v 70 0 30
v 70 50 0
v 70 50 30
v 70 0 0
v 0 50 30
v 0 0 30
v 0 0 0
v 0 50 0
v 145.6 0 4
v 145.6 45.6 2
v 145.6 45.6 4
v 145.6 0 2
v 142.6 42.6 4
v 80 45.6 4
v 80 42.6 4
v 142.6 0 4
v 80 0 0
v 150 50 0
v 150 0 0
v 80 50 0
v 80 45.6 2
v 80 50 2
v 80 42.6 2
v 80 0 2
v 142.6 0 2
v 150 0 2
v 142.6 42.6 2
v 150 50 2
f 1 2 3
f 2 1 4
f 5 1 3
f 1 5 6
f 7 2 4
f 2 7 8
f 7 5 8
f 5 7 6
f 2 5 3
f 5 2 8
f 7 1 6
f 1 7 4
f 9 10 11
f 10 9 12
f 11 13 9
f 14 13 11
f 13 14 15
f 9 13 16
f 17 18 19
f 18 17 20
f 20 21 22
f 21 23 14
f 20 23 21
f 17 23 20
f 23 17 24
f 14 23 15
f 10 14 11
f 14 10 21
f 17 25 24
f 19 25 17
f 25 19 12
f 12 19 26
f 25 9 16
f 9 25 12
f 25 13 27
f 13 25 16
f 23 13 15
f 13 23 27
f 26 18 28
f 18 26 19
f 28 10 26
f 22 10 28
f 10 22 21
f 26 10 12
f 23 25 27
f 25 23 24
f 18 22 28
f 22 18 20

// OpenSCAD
// Two-part enclosure for a small electronics board (Arduino temp logger)
// Part 1: open box, Part 2: lid printed upside down, side by side on the bed.
// Units: mm. Print orientation: both parts rest on the XY plane at z = 0.

// ---- Named dimensions (measured with calipers) ----
box_outer_x   = 70.0;   // box outer length (X)
box_outer_y   = 50.0;   // box outer width  (Y)
box_outer_z   = 30.0;   // box outer height (Z)
wall_t        = 2.0;    // wall thickness
floor_t       = 2.0;    // floor thickness
lid_plate_t   = 2.0;    // lid plate thickness
lid_lip_t     = 1.5;    // lid lip wall thickness
lid_lip_h     = 4.0;    // lid lip height
lid_lip_outer_x = 65.6; // lip outer length (X)
lid_lip_outer_y = 45.6; // lip outer width  (Y)
gap           = 10.0;   // gap between the two parts on the bed

// Derived values
box_inner_x   = box_outer_x - 2 * wall_t;   // 66
box_inner_y   = box_outer_y - 2 * wall_t;   // 46
box_inner_z   = box_outer_z - floor_t;      // 28 (interior height)
lip_inner_x   = lid_lip_outer_x - 2 * lid_lip_t; // 62.6
lip_inner_y   = lid_lip_outer_y - 2 * lid_lip_t; // 42.6

// ---- Part 1: the box (open top), centred on the origin ----
module box() {
    // Outer shell
    cube([box_outer_x, box_outer_y, box_outer_z], center = [0, 0, box_outer_z / 2]);
    difference() {
        // Interior cavity, open at the top (cavity extends 1 mm above the rim)
        cube([box_inner_x, box_inner_y, box_inner_z + 1],
             center = [0, 0, floor_t + box_inner_z / 2]);
    }
}

// ---- Part 2: the lid, printed upside down ----
// Plate lies flat on the bed (z 0..2). The lip is a 1.5 mm wall, 4 mm tall,
// centred on the plate, with a 0.2 mm clearance per side vs. the box opening.
module lid() {
    // Plate
    cube([box_outer_x, box_outer_y, lid_plate_t], center = [0, 0, lid_plate_t / 2]);
    // Lip: outer wall minus inner void (void extends 1 mm above the lip top)
    difference() {
        cube([lid_lip_outer_x, lid_lip_outer_y, lid_lip_h],
             center = [0, 0, lid_plate_t + lid_lip_h / 2]);
        cube([lip_inner_x, lip_inner_y, lid_lip_h + 1],
             center = [0, 0, lid_plate_t + lid_lip_h / 2]);
    }
}

// ---- Place both parts side by side on the bed, 10 mm apart ----
// Box centred at origin; lid on the +X side.
box();
translate([box_outer_x / 2 + gap + box_outer_x / 2, 0, 0]) lid();
